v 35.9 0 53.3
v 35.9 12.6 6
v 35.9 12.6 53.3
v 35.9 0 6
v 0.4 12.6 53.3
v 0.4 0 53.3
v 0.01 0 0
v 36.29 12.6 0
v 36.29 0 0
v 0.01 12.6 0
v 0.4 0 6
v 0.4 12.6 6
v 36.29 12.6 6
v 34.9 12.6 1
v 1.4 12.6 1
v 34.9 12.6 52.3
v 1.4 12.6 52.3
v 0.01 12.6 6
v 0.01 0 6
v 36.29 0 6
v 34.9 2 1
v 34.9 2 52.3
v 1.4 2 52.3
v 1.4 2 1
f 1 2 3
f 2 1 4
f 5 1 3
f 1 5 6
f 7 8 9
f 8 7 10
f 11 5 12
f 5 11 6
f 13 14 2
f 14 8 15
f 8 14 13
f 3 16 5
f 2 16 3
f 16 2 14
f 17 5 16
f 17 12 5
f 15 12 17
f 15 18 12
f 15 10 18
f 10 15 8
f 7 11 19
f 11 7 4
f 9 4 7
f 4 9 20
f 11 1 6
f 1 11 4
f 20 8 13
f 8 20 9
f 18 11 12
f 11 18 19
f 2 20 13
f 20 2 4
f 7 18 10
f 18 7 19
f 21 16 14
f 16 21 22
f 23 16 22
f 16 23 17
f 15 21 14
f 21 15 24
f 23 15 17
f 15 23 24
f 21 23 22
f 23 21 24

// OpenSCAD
//sof
// --------------------------------------------------------

//match case
width=36.3;
thickness=13;
height=53.3;

shellTop=1;
shellSide=2;
shellLast=1;

shellImage=1;

shellDrawer=1;
shellSure=2;

paper=0.6;

// left and bottom slot
slot=thickness/1.5;

// main slot
mainslotdelta=4;
mainslotw=width+shellSide-mainslotdelta;
mainsloth=height+shellLast-mainslotdelta;

// drawer
gapW = 0.4;
gapH = 0.2;
gapClip = 0.05;
biggerGapClip = 0.01;
 
// --------------------------------------------------------

module mainRectPlate() { union() {
   
    // middle plate rectangle
    translate([-mainslotw/2,thickness/2-slot/4,mainslotdelta/2+slot/2]){
        cube([mainslotw, shellSure*4, mainsloth-slot]);
    }

    // cross rectangle
    translate([-mainslotw/2+slot/2,thickness/2-slot/4,mainslotdelta/2]){
        cube([mainslotw-slot, shellSure*4, mainsloth]);
    }

    // circle top left
    translate([mainslotw/2-slot/2,
            thickness/2+2*shellSure,
            mainsloth-slot/2+mainslotdelta/2]){
        rotate(a = 90, v=[1, 0, 0]) cylinder(r=slot/2, h=shellSure*4);
    }

    // circle top right
    translate([-mainslotw/2+slot/2,
            thickness/2+2*shellSure,
            mainsloth-slot/2+mainslotdelta/2]){
        rotate(a = 90, v=[1, 0, 0]) cylinder(r=slot/2, h=shellSure*4);
    }

    // circle bottom left
    translate([mainslotw/2-slot/2,
            thickness/2+2*shellSure,
            slot/2+mainslotdelta/2]){
        rotate(a = 90, v=[1, 0, 0]) cylinder(r=slot/2, h=shellSure*4);
    }

    // circle bottom right
    translate([-mainslotw/2+slot/2,
            thickness/2+2*shellSure,
            slot/2+mainslotdelta/2]){
        rotate(a = 90, v=[1, 0, 0]) cylinder(r=slot/2, h=shellSure*4);
    }

}}

// --------------------------------------------------------

module mainRhombusPlate1() {
    resize([mainslotw,shellSure*4,mainsloth])
    translate([-(mainslotw*sqrt(2))/4,0,(mainslotw*sqrt(2))/4])
    rotate(a=45, v=[0,1,0])
    resize([mainslotw,shellSure*4,mainslotw])
    mainRectPlate();
}

module mainRhombusPlate() { union() {

    mainRhombusPlate1();

}}

// --------------------------------------------------------

module leftRoundPlate() {union() {
    
    //circle1
    translate([width/2,0,height+shellLast-slot]){
    rotate(a = 90, v=[0, 1, 0]) cylinder(r=slot/2, h=shellSide*4);
    }

    //circle2
    translate([width/2,0,slot]){
    rotate(a = 90, v=[0, 1, 0]) cylinder(r=slot/2, h=shellSide*4);
    }

    //rectangle
    translate([width/2,-slot/2,slot]){
        cube([shellSide*4, slot, (height+shellLast-slot*2)]);
    }

}}

module rightRoundPlate() {
    
    translate([-width-slot/4,0,0])leftRoundPlate();

}

module leftSquarePlate() {union() {
    
    //rectangle
    translate([width/2,-slot/2,slot]){
        cube([shellSide*2, slot, (height+shellLast-slot*2)]);
    }

}}


module rightSquarePlate() {
    
    translate([-width-shellSide,0,0])
    leftSquarePlate();

}

// --------------------------------------------------------

module bottomPlate() { union() {

    // circle1
    translate([-width*0.5+slot,0,-shellSure*2]){
        cylinder(r=slot/2, h=shellSure*4);
    }

    //circle2
    translate([width*0.5-slot,0,-shellSure*2]){
        cylinder(r=slot/2, h=shellSure*4);
    }

    //rectangle
    translate([-width*0.5+slot,-slot/2,-shellSure*2]){
        cube([width-slot*2, slot, shellSure*4]);
    }

}}

// --------------------------------------------------------

module mainBox() { difference() {

    //outside box
    translate([-(width+shellSide*2)/2,-(thickness+shellTop*2)/2,0]){
        cube([width+shellSide*2, thickness+shellTop*2, height+shellLast]);
        }

    //inside box
    translate([-width/2,-thickness/2,shellLast]){
        cube([width, thickness, height+shellLast*2]);
        }

}}

// --------------------------------------------------------
// image

module image() {
    // name="matchbox-pipe-template-heights.png";
    // name="matchbox-pipe-template-heights-small.png";
    name="pipe-plate-1.png";
    
    w=width+2*shellSide;
    h=height+shellLast;

    moveby=thickness/2+2*shellImage;
    
    translate([w/2,-moveby,0])
    rotate(a=-90, v=[0,1,0])
    rotate(a=90, v=[1,0,0])
    resize([h,w,shellImage])
    surface(file=name, invert=true);
}

// --------------------------------------------------------
// cover

module openedRectCover() {difference(){

    mainBox();
        
    mainRectPlate();
    leftRoundPlate();
    rightRoundPlate();
    bottomPlate();

}}

module openedRoundCover() {difference(){

    mainBox();
        
    mainRhombusPlate();
    leftRoundPlate();
    rightRoundPlate();
    bottomPlate();

}}

module closedCover() {difference(){

    mainBox();
        
    leftRoundPlate();
    rightRoundPlate();
    bottomPlate();

}}

module fullCover() {difference(){

    mainBox();
        
    translate([shellSide-paper,0,0])leftSquarePlate();
    translate([-2*shellSide+paper,0,0])rightSquarePlate();
    bottomPlate();

}}

module imageCover() {union() {
    
    image();
    
    fullCover();
    
}}

// --------------------------------------------------------
// drawer

module drawer() { difference() {
    
    x = width-2*gapW;
    y = thickness-2*gapH;
    z = height;

    x1 = width-2*gapClip;
    //y1 = thickness-2*gapH;
    z1 = 6*shellDrawer;

    x2 = width-2*biggerGapClip;

    union() {

        //outside box
        translate([gapW,0,0])
        cube([x, y, z]);

        // original handle
        // translate([gapClip,0,0])
        // cube([x1, y, z1]);

        // bigger handle
        translate([biggerGapClip,0,0])
        cube([x2, y, z1]);
    }
    
    //inside box
    
    translate([shellDrawer+gapW,2*shellDrawer,shellDrawer])
    cube([x-2*shellDrawer, y-shellDrawer, z-2*shellDrawer]);
    
}}


// --------------------------------------------------------
// main part



drawer();

//fullCover();

// imageCover();


/*
openedRectCover();
openedRoundCover();

union(){
    rightRoundPlate();
    leftSquarePlate();
}
*/
// --------------------------------------------------------
// eof
